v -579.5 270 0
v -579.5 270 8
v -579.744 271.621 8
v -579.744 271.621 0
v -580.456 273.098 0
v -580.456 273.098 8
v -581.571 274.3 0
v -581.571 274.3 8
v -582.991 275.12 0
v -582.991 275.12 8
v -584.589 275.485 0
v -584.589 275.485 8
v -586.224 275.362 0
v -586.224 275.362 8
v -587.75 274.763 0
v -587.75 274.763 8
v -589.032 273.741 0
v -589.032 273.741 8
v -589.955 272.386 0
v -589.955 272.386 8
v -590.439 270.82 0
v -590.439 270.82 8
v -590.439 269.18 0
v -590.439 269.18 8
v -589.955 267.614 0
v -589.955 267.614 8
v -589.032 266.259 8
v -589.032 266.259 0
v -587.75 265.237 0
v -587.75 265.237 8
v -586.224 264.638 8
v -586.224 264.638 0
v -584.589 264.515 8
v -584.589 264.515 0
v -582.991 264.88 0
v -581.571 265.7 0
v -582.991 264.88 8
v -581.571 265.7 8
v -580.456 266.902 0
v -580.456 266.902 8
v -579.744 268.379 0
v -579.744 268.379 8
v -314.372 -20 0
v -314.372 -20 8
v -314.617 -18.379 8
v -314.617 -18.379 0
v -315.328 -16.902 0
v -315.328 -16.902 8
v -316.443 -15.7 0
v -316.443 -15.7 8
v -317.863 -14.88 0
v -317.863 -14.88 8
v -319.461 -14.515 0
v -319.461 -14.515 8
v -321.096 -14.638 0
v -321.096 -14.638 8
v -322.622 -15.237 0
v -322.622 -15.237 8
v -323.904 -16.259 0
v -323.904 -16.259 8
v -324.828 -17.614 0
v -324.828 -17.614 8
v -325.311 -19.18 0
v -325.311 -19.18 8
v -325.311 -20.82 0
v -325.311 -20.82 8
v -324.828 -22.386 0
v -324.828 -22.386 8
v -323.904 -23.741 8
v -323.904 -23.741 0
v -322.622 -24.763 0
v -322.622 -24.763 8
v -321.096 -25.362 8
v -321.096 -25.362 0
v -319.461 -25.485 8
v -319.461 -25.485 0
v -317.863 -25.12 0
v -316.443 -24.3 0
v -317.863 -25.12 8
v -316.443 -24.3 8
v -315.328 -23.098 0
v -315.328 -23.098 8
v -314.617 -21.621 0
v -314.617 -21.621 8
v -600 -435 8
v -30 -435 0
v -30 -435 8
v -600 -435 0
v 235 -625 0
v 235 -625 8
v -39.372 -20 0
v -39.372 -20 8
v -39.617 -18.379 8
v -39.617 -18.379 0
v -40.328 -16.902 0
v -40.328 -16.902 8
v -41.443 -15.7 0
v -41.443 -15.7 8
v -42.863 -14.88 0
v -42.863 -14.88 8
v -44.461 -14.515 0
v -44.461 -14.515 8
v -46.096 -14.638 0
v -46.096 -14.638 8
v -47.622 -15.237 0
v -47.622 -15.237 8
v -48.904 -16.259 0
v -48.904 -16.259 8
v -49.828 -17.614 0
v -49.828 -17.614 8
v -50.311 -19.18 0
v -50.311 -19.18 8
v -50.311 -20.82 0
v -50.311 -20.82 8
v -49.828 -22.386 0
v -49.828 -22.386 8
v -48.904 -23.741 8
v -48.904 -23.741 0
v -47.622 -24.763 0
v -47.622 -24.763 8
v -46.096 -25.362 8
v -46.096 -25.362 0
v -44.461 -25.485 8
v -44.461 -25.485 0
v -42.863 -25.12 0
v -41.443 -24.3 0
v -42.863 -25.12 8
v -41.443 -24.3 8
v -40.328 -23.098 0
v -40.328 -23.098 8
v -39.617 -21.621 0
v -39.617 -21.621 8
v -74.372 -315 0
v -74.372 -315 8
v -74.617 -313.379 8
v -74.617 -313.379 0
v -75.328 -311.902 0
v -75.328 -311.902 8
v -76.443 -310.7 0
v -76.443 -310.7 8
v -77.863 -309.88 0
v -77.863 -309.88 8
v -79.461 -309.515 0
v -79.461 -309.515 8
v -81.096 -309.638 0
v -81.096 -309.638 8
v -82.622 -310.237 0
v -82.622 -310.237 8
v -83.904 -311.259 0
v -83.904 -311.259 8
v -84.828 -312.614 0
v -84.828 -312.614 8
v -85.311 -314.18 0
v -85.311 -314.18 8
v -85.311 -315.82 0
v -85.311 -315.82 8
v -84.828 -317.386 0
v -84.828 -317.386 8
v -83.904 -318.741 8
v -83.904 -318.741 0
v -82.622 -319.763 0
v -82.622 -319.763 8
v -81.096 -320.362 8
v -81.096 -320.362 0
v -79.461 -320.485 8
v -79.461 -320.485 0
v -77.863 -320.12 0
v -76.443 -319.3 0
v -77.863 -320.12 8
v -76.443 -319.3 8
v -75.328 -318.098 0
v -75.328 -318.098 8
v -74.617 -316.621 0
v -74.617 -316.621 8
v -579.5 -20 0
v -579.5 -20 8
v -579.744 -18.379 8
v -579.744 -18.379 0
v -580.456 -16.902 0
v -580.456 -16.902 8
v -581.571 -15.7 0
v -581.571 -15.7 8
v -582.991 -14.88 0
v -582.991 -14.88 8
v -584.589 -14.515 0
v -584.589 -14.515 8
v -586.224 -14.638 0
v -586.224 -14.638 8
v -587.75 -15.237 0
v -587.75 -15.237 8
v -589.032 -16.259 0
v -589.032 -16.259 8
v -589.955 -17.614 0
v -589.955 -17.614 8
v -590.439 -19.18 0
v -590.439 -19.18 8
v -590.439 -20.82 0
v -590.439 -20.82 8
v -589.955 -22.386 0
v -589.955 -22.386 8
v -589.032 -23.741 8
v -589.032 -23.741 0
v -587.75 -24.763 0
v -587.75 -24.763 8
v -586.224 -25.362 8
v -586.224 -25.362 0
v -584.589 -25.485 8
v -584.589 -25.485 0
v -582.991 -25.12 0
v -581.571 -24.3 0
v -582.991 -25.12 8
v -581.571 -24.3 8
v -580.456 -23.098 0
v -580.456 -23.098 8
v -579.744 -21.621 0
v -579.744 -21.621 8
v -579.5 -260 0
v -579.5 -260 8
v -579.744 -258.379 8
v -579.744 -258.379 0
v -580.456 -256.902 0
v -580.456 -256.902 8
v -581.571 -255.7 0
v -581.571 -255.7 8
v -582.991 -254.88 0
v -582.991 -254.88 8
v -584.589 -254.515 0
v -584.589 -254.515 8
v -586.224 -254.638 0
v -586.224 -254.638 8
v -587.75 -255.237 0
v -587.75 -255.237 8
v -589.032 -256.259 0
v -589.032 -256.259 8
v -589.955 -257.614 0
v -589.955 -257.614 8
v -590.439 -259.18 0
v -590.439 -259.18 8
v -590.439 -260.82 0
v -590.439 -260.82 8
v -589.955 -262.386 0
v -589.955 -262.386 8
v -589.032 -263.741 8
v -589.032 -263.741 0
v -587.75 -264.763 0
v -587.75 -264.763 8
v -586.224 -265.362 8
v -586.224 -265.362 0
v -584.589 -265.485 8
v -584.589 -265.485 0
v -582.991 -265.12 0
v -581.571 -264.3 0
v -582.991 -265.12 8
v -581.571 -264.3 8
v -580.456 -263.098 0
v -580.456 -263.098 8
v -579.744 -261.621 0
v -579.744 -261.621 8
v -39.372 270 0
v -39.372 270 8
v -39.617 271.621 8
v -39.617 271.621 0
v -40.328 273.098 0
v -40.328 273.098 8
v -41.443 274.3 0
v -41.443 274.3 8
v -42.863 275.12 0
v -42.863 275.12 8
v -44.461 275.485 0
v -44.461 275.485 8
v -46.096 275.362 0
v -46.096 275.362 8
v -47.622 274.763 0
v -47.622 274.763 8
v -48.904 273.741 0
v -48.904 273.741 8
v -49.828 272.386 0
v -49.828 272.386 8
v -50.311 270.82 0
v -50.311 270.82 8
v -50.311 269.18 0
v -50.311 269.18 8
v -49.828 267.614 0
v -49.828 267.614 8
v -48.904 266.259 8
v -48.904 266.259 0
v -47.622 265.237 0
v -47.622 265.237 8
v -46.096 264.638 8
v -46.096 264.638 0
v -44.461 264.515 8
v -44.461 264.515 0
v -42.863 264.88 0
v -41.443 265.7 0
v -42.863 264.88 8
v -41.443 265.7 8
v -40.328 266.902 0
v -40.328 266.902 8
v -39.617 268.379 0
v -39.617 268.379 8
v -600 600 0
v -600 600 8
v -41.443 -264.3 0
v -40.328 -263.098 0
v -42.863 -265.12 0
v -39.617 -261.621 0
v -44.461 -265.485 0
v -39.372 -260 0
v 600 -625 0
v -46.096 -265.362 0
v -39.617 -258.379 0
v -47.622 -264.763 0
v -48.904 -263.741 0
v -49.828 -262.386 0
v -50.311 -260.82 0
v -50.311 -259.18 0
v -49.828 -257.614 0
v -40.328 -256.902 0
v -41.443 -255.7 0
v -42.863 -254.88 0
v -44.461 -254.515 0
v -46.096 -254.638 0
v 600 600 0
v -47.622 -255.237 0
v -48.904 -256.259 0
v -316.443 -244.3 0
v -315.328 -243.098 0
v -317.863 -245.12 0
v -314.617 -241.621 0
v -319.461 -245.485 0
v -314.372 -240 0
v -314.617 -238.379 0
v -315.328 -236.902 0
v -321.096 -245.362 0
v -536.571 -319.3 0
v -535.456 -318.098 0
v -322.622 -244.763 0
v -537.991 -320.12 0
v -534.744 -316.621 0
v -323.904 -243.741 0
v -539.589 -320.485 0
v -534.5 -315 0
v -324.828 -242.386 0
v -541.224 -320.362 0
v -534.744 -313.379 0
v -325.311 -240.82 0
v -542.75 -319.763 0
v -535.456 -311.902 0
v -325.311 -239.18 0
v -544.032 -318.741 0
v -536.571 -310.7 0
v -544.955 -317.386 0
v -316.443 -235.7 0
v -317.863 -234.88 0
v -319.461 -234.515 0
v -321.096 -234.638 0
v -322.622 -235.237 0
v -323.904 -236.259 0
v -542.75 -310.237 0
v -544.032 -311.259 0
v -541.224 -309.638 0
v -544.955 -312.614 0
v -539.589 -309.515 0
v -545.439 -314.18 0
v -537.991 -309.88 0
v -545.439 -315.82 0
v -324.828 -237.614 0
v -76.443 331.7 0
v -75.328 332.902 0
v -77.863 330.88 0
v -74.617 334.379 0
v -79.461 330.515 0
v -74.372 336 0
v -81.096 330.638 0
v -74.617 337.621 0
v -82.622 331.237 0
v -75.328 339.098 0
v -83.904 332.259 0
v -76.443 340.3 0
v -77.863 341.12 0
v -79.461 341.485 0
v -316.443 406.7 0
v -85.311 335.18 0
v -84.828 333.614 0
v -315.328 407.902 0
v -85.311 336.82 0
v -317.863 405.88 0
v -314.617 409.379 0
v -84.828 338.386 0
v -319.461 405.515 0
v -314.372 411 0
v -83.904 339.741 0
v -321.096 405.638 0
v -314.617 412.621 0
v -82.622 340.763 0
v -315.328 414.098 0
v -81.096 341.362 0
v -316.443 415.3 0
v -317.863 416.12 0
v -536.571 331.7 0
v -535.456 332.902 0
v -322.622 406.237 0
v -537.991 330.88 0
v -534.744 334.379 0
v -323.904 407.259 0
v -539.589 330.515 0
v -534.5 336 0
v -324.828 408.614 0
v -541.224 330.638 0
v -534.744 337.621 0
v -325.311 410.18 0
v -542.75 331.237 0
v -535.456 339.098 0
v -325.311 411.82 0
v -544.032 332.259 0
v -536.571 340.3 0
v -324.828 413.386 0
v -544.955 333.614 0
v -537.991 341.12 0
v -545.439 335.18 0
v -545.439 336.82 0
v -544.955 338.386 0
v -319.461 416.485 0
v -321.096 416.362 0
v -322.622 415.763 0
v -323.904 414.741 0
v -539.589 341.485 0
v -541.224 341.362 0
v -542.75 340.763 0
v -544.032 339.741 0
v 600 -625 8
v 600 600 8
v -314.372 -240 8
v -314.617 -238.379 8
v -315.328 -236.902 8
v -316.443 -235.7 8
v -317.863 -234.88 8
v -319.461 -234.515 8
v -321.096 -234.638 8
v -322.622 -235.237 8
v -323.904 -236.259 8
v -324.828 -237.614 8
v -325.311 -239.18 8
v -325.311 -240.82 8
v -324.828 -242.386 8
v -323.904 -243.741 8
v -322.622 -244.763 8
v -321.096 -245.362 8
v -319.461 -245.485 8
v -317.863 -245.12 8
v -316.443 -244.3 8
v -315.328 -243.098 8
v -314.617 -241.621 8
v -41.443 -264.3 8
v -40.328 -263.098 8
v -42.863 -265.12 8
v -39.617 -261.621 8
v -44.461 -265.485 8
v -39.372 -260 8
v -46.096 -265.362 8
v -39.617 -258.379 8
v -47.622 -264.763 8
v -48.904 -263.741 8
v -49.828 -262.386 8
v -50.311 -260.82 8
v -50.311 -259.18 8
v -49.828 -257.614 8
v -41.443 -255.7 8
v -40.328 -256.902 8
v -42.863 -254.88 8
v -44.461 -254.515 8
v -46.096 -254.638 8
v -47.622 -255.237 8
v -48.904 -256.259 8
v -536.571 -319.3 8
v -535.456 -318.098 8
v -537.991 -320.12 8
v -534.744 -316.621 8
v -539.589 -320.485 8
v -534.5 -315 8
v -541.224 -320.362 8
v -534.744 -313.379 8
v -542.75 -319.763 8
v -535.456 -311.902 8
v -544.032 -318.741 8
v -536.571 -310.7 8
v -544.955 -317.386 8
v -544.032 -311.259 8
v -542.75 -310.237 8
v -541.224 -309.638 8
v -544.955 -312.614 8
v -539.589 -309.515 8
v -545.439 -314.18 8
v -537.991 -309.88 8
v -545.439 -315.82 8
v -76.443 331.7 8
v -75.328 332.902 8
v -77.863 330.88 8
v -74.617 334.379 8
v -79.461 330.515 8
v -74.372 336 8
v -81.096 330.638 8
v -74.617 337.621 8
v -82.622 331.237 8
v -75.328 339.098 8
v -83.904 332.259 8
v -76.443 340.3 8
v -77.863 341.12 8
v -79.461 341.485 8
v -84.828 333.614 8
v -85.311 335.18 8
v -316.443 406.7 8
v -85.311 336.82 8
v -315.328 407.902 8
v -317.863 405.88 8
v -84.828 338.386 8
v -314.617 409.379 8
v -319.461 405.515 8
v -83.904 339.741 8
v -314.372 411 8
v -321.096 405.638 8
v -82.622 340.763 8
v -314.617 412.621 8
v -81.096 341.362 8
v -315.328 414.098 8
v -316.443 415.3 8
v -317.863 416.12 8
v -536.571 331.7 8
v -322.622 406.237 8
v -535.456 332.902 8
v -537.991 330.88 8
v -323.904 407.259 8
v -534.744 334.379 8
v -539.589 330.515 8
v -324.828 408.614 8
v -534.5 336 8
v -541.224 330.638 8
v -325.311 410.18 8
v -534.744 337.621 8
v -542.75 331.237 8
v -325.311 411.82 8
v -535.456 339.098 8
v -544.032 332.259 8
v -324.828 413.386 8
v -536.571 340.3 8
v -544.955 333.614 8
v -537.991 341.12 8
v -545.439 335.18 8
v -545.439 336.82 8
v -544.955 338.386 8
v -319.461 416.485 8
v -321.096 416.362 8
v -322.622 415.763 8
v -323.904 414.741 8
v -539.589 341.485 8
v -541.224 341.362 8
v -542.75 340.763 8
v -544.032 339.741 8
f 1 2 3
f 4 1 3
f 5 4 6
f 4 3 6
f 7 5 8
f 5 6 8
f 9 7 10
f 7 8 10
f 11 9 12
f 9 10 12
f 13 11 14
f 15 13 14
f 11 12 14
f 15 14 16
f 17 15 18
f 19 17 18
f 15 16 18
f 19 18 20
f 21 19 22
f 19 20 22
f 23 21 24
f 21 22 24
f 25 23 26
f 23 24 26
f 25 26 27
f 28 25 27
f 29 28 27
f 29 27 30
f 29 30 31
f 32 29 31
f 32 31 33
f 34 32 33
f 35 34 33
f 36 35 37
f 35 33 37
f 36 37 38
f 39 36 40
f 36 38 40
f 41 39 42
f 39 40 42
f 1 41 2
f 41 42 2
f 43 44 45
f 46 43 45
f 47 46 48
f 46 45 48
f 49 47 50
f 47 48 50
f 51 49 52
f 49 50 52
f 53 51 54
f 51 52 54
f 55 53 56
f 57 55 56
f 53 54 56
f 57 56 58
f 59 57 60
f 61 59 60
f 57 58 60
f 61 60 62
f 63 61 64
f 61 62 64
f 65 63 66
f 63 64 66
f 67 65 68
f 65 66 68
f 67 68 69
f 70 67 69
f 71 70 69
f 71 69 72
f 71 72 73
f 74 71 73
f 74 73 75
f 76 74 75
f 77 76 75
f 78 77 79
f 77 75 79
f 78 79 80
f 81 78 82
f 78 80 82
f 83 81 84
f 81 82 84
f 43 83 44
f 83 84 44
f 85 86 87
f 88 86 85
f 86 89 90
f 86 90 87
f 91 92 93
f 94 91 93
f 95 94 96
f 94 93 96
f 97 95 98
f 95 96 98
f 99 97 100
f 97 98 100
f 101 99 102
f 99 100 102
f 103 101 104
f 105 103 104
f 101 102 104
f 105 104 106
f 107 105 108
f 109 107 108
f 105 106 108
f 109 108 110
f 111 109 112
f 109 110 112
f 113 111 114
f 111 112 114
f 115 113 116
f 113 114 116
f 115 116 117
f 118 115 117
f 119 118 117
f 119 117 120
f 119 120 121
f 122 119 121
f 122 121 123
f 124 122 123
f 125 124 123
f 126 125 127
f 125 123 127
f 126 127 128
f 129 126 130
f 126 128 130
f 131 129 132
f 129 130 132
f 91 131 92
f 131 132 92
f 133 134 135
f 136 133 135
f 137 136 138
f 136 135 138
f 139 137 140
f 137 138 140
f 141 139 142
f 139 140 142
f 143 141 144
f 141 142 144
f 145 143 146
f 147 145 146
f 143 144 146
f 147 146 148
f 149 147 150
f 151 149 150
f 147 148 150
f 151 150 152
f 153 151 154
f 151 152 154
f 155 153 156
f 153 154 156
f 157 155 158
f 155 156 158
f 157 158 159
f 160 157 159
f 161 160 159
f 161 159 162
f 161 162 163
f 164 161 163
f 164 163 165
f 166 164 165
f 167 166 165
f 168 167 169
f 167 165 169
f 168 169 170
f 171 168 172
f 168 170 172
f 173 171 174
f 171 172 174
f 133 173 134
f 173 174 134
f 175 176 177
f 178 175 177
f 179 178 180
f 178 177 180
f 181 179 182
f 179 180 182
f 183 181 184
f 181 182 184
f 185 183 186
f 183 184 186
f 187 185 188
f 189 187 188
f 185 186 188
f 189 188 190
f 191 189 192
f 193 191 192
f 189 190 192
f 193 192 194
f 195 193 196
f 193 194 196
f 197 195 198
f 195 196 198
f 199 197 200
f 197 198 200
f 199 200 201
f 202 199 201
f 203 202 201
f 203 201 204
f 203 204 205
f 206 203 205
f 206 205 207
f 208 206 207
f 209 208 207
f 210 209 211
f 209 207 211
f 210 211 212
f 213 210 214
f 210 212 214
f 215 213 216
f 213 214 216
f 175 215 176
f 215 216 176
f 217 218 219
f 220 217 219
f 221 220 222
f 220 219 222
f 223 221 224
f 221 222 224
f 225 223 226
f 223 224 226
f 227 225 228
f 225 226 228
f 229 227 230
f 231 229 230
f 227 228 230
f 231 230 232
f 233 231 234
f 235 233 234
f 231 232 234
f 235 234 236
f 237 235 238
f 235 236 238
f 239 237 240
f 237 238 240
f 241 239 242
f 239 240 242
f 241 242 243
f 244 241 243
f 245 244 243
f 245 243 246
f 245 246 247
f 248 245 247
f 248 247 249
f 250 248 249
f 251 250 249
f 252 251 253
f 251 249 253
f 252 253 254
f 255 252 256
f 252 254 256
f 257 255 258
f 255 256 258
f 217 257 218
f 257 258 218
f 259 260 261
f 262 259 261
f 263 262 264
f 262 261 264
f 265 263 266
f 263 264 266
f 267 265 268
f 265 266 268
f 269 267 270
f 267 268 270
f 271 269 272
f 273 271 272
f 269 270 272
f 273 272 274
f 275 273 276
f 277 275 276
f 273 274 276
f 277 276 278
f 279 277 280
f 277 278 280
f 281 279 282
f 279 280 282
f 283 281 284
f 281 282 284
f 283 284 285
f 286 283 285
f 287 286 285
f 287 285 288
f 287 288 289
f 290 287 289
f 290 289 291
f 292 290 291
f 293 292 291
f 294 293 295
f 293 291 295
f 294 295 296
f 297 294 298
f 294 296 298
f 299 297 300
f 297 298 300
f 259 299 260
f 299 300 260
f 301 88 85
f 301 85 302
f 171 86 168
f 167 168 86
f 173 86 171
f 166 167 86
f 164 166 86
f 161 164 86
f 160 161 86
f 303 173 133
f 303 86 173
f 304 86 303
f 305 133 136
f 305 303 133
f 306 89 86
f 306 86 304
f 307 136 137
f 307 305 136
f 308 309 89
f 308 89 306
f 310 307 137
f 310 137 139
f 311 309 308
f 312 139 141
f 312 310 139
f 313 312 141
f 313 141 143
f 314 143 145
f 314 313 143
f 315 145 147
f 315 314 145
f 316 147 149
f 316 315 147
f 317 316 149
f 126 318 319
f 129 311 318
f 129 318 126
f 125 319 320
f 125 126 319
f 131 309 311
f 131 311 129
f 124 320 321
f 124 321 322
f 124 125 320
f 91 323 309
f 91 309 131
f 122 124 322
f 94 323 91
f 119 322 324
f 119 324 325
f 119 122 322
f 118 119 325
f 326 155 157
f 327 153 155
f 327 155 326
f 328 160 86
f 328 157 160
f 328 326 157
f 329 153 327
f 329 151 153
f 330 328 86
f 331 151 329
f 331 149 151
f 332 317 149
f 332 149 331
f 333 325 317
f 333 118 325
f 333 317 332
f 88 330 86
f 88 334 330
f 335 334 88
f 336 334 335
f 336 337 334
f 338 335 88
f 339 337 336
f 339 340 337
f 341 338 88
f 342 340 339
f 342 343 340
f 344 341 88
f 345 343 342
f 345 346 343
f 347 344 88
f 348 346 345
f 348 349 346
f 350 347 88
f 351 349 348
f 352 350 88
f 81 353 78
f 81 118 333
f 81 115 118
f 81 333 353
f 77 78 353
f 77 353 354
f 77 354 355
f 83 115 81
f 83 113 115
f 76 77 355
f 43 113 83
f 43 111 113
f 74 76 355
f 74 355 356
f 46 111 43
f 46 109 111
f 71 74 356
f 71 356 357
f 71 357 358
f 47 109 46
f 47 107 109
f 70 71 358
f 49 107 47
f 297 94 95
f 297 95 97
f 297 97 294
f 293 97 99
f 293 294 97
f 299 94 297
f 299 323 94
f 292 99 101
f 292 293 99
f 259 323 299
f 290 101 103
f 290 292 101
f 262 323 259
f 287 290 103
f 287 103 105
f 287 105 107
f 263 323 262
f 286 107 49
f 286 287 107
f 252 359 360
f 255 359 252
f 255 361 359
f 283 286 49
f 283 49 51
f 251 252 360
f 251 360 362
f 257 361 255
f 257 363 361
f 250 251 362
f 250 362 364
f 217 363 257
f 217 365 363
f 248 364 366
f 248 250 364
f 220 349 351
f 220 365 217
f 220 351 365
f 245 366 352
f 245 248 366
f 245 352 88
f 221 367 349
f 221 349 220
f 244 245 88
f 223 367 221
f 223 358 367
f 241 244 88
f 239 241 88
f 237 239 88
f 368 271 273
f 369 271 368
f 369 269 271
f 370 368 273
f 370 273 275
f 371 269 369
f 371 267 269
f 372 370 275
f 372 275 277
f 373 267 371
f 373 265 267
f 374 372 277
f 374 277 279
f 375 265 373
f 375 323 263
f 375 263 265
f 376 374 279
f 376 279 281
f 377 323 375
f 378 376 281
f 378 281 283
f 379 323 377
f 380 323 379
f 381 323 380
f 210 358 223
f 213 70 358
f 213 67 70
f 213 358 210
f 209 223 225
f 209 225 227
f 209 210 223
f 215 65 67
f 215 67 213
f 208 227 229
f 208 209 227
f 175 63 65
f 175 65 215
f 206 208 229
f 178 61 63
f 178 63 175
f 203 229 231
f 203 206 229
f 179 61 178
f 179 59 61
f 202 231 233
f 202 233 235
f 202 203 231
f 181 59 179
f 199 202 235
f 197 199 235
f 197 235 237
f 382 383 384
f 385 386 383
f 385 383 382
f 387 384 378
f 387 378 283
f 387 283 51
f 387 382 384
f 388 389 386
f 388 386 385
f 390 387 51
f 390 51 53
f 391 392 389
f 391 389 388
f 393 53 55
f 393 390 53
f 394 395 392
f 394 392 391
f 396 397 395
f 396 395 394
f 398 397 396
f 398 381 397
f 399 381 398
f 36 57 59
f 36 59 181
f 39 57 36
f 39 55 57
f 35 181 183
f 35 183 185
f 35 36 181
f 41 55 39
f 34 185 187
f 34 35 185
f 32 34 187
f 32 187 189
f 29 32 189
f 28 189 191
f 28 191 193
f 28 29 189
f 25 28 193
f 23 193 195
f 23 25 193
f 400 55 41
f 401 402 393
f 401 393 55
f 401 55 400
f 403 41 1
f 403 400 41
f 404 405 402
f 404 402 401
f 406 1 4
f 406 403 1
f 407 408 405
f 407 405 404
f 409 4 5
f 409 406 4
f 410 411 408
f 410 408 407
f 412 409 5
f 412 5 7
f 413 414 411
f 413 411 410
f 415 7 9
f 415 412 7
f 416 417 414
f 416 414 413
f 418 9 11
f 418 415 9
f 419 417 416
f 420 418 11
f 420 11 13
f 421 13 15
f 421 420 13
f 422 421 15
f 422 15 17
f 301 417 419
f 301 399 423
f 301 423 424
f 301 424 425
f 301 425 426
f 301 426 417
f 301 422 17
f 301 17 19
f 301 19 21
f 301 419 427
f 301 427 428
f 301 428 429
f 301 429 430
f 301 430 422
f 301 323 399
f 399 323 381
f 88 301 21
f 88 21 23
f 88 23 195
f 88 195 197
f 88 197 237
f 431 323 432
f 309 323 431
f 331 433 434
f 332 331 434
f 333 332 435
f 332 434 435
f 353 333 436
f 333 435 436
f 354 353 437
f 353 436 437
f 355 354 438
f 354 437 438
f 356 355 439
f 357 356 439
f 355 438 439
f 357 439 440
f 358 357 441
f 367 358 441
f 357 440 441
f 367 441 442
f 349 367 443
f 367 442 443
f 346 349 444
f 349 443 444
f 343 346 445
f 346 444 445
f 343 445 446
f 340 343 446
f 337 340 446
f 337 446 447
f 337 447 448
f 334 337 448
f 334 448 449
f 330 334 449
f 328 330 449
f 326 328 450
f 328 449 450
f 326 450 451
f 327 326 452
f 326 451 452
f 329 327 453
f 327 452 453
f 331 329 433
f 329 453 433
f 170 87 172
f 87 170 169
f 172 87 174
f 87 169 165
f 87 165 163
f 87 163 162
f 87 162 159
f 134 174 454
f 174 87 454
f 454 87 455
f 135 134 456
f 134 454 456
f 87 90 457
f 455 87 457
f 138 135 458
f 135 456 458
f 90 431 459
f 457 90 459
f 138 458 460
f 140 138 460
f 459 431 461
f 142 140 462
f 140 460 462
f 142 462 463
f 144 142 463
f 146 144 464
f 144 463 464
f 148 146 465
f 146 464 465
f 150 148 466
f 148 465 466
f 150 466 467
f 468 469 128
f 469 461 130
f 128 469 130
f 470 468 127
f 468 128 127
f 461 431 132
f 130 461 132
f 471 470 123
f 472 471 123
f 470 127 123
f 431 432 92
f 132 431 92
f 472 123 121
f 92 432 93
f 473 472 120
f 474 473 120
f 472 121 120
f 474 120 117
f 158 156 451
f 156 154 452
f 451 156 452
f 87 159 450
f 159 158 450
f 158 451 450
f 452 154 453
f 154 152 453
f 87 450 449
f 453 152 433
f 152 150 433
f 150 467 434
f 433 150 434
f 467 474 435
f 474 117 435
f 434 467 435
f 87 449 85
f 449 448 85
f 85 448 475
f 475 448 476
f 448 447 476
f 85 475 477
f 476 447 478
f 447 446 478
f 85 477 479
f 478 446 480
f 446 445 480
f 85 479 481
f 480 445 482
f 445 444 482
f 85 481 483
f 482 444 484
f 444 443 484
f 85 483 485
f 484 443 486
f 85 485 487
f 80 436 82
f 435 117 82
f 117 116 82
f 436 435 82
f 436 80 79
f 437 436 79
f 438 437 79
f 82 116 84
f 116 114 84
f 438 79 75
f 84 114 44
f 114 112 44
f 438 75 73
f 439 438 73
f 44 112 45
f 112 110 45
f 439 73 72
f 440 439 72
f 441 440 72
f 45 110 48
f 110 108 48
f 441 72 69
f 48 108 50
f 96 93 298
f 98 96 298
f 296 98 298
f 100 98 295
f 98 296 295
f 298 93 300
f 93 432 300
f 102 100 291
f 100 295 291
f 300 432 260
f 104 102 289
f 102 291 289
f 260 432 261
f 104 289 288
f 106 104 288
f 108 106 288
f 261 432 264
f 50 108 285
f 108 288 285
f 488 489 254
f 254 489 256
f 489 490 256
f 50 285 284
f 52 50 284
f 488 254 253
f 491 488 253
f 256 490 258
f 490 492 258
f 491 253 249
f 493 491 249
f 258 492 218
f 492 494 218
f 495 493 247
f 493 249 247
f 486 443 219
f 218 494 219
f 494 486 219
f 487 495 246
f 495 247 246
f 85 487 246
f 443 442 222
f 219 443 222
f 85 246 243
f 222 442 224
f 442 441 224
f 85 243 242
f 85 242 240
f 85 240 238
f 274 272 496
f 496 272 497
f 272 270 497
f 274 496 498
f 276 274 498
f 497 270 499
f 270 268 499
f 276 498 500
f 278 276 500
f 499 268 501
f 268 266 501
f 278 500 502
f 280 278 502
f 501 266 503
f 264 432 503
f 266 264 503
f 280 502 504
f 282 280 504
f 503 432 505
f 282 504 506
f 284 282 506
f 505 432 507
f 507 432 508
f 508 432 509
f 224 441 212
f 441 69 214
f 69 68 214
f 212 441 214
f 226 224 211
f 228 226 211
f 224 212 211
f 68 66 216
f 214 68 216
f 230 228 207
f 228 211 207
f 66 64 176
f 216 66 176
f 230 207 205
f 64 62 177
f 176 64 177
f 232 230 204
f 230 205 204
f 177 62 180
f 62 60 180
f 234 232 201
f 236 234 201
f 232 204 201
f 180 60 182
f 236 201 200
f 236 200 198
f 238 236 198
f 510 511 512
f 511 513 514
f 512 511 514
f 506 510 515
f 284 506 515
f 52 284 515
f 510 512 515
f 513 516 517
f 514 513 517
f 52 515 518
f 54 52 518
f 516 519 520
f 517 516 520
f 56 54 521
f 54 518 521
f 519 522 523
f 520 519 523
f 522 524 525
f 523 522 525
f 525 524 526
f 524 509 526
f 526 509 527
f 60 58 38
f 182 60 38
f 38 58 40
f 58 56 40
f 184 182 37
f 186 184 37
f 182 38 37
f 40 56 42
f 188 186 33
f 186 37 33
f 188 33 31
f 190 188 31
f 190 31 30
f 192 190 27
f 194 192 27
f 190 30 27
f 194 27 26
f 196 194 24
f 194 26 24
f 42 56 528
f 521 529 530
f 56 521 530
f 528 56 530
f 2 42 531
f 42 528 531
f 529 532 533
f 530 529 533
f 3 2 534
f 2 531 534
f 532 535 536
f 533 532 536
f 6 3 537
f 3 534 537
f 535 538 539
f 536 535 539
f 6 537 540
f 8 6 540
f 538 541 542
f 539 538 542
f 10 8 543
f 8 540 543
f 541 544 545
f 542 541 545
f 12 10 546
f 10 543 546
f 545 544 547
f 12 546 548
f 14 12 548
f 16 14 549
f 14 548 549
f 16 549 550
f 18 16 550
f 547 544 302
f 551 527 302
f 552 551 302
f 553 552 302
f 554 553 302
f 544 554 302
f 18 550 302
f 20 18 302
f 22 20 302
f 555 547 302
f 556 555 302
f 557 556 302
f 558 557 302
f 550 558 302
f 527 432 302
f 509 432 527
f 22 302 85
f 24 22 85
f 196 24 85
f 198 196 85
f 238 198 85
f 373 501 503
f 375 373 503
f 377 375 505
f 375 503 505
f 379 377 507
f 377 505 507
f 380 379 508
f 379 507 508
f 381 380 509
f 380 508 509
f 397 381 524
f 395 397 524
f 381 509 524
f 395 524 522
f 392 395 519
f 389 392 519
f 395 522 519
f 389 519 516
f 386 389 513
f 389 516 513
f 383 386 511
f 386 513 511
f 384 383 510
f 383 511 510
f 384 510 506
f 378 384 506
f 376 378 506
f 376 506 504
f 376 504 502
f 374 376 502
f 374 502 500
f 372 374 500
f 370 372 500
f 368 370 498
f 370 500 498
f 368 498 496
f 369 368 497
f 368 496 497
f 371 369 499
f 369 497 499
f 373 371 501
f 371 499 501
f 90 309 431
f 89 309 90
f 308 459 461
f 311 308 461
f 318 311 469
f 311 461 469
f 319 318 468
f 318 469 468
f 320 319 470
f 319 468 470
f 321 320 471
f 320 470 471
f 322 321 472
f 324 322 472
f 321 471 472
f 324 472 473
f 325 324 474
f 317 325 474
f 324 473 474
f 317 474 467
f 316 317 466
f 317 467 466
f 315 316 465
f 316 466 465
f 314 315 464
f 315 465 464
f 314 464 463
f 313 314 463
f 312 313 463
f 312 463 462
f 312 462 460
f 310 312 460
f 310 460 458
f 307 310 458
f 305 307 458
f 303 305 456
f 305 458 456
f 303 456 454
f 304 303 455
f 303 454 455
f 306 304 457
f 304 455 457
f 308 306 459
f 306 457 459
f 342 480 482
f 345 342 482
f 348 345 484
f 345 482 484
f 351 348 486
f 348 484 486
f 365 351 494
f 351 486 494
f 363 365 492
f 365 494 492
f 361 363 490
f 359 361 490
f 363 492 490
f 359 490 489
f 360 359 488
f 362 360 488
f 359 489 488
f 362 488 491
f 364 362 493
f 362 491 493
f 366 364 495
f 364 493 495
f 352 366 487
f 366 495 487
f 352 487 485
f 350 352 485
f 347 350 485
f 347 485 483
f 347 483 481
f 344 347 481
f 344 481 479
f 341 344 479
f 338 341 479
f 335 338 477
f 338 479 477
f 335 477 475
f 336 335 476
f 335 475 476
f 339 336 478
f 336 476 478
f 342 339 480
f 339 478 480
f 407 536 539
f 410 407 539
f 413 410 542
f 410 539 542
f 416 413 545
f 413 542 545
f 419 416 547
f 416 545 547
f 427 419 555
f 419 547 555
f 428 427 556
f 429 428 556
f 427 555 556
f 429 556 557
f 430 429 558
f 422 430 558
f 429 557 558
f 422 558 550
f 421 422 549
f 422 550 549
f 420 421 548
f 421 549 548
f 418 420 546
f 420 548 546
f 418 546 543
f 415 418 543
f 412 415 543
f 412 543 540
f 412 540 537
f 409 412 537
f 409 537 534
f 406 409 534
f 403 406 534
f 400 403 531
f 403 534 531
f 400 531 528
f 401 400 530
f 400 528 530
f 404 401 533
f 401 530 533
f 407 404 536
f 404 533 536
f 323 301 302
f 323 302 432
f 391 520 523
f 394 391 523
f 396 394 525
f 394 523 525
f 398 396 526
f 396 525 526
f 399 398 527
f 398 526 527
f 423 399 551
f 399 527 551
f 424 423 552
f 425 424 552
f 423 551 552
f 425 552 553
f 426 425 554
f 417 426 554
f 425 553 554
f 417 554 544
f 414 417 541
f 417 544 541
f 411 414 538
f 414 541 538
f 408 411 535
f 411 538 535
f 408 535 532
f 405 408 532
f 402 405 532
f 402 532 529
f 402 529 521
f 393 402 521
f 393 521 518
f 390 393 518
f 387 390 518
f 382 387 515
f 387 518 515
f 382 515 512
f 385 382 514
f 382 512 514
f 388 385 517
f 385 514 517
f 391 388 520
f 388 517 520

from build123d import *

# Parameters (mm, degrees)
ESTRUSIONE_ESTRUSIONE1_DEPTH = 8
SCHIZZO2_R                   = 5.5
TAGLIO_ESTRUSIONE1_DEPTH     = 8


with BuildPart() as part:
    # Schizzo1 → Estrusione-Estrusione1 (new body)
    with BuildSketch(Plane.XY):
        Polygon((-600, 600), (600, 600), (600, -625), (235, -625), (-30, -435), (-600, -435), align=None)
    extrude(amount=ESTRUSIONE_ESTRUSIONE1_DEPTH)

    # Schizzo2 → Taglio-Estrusione1 (cut)
    with BuildSketch(Plane.XY.offset(8)):
        with Locations((-585, -260)):
            Circle(SCHIZZO2_R)
        with Locations((-540, -315)):
            Circle(SCHIZZO2_R)
        with Locations((-79.872266189, -315)):
            Circle(SCHIZZO2_R)
        with Locations((-44.872266189, -260)):
            Circle(SCHIZZO2_R)
        with Locations((-44.872266189, -20)):
            Circle(SCHIZZO2_R)
        with Locations((-79.872266189, 336)):
            Circle(SCHIZZO2_R)
        with Locations((-540, 336)):
            Circle(SCHIZZO2_R)
        with Locations((-585, -20)):
            Circle(SCHIZZO2_R)
        with Locations((-585, 270)):
            Circle(SCHIZZO2_R)
        with Locations((-44.872266189, 270)):
            Circle(SCHIZZO2_R)
        with Locations((-319.872266189, 411)):
            Circle(SCHIZZO2_R)
        with Locations((-319.872266189, -20)):
            Circle(SCHIZZO2_R)
        with Locations((-319.872266189, -240)):
            Circle(SCHIZZO2_R)
    extrude(amount=-TAGLIO_ESTRUSIONE1_DEPTH, mode=Mode.SUBTRACT)


solid = part.part
